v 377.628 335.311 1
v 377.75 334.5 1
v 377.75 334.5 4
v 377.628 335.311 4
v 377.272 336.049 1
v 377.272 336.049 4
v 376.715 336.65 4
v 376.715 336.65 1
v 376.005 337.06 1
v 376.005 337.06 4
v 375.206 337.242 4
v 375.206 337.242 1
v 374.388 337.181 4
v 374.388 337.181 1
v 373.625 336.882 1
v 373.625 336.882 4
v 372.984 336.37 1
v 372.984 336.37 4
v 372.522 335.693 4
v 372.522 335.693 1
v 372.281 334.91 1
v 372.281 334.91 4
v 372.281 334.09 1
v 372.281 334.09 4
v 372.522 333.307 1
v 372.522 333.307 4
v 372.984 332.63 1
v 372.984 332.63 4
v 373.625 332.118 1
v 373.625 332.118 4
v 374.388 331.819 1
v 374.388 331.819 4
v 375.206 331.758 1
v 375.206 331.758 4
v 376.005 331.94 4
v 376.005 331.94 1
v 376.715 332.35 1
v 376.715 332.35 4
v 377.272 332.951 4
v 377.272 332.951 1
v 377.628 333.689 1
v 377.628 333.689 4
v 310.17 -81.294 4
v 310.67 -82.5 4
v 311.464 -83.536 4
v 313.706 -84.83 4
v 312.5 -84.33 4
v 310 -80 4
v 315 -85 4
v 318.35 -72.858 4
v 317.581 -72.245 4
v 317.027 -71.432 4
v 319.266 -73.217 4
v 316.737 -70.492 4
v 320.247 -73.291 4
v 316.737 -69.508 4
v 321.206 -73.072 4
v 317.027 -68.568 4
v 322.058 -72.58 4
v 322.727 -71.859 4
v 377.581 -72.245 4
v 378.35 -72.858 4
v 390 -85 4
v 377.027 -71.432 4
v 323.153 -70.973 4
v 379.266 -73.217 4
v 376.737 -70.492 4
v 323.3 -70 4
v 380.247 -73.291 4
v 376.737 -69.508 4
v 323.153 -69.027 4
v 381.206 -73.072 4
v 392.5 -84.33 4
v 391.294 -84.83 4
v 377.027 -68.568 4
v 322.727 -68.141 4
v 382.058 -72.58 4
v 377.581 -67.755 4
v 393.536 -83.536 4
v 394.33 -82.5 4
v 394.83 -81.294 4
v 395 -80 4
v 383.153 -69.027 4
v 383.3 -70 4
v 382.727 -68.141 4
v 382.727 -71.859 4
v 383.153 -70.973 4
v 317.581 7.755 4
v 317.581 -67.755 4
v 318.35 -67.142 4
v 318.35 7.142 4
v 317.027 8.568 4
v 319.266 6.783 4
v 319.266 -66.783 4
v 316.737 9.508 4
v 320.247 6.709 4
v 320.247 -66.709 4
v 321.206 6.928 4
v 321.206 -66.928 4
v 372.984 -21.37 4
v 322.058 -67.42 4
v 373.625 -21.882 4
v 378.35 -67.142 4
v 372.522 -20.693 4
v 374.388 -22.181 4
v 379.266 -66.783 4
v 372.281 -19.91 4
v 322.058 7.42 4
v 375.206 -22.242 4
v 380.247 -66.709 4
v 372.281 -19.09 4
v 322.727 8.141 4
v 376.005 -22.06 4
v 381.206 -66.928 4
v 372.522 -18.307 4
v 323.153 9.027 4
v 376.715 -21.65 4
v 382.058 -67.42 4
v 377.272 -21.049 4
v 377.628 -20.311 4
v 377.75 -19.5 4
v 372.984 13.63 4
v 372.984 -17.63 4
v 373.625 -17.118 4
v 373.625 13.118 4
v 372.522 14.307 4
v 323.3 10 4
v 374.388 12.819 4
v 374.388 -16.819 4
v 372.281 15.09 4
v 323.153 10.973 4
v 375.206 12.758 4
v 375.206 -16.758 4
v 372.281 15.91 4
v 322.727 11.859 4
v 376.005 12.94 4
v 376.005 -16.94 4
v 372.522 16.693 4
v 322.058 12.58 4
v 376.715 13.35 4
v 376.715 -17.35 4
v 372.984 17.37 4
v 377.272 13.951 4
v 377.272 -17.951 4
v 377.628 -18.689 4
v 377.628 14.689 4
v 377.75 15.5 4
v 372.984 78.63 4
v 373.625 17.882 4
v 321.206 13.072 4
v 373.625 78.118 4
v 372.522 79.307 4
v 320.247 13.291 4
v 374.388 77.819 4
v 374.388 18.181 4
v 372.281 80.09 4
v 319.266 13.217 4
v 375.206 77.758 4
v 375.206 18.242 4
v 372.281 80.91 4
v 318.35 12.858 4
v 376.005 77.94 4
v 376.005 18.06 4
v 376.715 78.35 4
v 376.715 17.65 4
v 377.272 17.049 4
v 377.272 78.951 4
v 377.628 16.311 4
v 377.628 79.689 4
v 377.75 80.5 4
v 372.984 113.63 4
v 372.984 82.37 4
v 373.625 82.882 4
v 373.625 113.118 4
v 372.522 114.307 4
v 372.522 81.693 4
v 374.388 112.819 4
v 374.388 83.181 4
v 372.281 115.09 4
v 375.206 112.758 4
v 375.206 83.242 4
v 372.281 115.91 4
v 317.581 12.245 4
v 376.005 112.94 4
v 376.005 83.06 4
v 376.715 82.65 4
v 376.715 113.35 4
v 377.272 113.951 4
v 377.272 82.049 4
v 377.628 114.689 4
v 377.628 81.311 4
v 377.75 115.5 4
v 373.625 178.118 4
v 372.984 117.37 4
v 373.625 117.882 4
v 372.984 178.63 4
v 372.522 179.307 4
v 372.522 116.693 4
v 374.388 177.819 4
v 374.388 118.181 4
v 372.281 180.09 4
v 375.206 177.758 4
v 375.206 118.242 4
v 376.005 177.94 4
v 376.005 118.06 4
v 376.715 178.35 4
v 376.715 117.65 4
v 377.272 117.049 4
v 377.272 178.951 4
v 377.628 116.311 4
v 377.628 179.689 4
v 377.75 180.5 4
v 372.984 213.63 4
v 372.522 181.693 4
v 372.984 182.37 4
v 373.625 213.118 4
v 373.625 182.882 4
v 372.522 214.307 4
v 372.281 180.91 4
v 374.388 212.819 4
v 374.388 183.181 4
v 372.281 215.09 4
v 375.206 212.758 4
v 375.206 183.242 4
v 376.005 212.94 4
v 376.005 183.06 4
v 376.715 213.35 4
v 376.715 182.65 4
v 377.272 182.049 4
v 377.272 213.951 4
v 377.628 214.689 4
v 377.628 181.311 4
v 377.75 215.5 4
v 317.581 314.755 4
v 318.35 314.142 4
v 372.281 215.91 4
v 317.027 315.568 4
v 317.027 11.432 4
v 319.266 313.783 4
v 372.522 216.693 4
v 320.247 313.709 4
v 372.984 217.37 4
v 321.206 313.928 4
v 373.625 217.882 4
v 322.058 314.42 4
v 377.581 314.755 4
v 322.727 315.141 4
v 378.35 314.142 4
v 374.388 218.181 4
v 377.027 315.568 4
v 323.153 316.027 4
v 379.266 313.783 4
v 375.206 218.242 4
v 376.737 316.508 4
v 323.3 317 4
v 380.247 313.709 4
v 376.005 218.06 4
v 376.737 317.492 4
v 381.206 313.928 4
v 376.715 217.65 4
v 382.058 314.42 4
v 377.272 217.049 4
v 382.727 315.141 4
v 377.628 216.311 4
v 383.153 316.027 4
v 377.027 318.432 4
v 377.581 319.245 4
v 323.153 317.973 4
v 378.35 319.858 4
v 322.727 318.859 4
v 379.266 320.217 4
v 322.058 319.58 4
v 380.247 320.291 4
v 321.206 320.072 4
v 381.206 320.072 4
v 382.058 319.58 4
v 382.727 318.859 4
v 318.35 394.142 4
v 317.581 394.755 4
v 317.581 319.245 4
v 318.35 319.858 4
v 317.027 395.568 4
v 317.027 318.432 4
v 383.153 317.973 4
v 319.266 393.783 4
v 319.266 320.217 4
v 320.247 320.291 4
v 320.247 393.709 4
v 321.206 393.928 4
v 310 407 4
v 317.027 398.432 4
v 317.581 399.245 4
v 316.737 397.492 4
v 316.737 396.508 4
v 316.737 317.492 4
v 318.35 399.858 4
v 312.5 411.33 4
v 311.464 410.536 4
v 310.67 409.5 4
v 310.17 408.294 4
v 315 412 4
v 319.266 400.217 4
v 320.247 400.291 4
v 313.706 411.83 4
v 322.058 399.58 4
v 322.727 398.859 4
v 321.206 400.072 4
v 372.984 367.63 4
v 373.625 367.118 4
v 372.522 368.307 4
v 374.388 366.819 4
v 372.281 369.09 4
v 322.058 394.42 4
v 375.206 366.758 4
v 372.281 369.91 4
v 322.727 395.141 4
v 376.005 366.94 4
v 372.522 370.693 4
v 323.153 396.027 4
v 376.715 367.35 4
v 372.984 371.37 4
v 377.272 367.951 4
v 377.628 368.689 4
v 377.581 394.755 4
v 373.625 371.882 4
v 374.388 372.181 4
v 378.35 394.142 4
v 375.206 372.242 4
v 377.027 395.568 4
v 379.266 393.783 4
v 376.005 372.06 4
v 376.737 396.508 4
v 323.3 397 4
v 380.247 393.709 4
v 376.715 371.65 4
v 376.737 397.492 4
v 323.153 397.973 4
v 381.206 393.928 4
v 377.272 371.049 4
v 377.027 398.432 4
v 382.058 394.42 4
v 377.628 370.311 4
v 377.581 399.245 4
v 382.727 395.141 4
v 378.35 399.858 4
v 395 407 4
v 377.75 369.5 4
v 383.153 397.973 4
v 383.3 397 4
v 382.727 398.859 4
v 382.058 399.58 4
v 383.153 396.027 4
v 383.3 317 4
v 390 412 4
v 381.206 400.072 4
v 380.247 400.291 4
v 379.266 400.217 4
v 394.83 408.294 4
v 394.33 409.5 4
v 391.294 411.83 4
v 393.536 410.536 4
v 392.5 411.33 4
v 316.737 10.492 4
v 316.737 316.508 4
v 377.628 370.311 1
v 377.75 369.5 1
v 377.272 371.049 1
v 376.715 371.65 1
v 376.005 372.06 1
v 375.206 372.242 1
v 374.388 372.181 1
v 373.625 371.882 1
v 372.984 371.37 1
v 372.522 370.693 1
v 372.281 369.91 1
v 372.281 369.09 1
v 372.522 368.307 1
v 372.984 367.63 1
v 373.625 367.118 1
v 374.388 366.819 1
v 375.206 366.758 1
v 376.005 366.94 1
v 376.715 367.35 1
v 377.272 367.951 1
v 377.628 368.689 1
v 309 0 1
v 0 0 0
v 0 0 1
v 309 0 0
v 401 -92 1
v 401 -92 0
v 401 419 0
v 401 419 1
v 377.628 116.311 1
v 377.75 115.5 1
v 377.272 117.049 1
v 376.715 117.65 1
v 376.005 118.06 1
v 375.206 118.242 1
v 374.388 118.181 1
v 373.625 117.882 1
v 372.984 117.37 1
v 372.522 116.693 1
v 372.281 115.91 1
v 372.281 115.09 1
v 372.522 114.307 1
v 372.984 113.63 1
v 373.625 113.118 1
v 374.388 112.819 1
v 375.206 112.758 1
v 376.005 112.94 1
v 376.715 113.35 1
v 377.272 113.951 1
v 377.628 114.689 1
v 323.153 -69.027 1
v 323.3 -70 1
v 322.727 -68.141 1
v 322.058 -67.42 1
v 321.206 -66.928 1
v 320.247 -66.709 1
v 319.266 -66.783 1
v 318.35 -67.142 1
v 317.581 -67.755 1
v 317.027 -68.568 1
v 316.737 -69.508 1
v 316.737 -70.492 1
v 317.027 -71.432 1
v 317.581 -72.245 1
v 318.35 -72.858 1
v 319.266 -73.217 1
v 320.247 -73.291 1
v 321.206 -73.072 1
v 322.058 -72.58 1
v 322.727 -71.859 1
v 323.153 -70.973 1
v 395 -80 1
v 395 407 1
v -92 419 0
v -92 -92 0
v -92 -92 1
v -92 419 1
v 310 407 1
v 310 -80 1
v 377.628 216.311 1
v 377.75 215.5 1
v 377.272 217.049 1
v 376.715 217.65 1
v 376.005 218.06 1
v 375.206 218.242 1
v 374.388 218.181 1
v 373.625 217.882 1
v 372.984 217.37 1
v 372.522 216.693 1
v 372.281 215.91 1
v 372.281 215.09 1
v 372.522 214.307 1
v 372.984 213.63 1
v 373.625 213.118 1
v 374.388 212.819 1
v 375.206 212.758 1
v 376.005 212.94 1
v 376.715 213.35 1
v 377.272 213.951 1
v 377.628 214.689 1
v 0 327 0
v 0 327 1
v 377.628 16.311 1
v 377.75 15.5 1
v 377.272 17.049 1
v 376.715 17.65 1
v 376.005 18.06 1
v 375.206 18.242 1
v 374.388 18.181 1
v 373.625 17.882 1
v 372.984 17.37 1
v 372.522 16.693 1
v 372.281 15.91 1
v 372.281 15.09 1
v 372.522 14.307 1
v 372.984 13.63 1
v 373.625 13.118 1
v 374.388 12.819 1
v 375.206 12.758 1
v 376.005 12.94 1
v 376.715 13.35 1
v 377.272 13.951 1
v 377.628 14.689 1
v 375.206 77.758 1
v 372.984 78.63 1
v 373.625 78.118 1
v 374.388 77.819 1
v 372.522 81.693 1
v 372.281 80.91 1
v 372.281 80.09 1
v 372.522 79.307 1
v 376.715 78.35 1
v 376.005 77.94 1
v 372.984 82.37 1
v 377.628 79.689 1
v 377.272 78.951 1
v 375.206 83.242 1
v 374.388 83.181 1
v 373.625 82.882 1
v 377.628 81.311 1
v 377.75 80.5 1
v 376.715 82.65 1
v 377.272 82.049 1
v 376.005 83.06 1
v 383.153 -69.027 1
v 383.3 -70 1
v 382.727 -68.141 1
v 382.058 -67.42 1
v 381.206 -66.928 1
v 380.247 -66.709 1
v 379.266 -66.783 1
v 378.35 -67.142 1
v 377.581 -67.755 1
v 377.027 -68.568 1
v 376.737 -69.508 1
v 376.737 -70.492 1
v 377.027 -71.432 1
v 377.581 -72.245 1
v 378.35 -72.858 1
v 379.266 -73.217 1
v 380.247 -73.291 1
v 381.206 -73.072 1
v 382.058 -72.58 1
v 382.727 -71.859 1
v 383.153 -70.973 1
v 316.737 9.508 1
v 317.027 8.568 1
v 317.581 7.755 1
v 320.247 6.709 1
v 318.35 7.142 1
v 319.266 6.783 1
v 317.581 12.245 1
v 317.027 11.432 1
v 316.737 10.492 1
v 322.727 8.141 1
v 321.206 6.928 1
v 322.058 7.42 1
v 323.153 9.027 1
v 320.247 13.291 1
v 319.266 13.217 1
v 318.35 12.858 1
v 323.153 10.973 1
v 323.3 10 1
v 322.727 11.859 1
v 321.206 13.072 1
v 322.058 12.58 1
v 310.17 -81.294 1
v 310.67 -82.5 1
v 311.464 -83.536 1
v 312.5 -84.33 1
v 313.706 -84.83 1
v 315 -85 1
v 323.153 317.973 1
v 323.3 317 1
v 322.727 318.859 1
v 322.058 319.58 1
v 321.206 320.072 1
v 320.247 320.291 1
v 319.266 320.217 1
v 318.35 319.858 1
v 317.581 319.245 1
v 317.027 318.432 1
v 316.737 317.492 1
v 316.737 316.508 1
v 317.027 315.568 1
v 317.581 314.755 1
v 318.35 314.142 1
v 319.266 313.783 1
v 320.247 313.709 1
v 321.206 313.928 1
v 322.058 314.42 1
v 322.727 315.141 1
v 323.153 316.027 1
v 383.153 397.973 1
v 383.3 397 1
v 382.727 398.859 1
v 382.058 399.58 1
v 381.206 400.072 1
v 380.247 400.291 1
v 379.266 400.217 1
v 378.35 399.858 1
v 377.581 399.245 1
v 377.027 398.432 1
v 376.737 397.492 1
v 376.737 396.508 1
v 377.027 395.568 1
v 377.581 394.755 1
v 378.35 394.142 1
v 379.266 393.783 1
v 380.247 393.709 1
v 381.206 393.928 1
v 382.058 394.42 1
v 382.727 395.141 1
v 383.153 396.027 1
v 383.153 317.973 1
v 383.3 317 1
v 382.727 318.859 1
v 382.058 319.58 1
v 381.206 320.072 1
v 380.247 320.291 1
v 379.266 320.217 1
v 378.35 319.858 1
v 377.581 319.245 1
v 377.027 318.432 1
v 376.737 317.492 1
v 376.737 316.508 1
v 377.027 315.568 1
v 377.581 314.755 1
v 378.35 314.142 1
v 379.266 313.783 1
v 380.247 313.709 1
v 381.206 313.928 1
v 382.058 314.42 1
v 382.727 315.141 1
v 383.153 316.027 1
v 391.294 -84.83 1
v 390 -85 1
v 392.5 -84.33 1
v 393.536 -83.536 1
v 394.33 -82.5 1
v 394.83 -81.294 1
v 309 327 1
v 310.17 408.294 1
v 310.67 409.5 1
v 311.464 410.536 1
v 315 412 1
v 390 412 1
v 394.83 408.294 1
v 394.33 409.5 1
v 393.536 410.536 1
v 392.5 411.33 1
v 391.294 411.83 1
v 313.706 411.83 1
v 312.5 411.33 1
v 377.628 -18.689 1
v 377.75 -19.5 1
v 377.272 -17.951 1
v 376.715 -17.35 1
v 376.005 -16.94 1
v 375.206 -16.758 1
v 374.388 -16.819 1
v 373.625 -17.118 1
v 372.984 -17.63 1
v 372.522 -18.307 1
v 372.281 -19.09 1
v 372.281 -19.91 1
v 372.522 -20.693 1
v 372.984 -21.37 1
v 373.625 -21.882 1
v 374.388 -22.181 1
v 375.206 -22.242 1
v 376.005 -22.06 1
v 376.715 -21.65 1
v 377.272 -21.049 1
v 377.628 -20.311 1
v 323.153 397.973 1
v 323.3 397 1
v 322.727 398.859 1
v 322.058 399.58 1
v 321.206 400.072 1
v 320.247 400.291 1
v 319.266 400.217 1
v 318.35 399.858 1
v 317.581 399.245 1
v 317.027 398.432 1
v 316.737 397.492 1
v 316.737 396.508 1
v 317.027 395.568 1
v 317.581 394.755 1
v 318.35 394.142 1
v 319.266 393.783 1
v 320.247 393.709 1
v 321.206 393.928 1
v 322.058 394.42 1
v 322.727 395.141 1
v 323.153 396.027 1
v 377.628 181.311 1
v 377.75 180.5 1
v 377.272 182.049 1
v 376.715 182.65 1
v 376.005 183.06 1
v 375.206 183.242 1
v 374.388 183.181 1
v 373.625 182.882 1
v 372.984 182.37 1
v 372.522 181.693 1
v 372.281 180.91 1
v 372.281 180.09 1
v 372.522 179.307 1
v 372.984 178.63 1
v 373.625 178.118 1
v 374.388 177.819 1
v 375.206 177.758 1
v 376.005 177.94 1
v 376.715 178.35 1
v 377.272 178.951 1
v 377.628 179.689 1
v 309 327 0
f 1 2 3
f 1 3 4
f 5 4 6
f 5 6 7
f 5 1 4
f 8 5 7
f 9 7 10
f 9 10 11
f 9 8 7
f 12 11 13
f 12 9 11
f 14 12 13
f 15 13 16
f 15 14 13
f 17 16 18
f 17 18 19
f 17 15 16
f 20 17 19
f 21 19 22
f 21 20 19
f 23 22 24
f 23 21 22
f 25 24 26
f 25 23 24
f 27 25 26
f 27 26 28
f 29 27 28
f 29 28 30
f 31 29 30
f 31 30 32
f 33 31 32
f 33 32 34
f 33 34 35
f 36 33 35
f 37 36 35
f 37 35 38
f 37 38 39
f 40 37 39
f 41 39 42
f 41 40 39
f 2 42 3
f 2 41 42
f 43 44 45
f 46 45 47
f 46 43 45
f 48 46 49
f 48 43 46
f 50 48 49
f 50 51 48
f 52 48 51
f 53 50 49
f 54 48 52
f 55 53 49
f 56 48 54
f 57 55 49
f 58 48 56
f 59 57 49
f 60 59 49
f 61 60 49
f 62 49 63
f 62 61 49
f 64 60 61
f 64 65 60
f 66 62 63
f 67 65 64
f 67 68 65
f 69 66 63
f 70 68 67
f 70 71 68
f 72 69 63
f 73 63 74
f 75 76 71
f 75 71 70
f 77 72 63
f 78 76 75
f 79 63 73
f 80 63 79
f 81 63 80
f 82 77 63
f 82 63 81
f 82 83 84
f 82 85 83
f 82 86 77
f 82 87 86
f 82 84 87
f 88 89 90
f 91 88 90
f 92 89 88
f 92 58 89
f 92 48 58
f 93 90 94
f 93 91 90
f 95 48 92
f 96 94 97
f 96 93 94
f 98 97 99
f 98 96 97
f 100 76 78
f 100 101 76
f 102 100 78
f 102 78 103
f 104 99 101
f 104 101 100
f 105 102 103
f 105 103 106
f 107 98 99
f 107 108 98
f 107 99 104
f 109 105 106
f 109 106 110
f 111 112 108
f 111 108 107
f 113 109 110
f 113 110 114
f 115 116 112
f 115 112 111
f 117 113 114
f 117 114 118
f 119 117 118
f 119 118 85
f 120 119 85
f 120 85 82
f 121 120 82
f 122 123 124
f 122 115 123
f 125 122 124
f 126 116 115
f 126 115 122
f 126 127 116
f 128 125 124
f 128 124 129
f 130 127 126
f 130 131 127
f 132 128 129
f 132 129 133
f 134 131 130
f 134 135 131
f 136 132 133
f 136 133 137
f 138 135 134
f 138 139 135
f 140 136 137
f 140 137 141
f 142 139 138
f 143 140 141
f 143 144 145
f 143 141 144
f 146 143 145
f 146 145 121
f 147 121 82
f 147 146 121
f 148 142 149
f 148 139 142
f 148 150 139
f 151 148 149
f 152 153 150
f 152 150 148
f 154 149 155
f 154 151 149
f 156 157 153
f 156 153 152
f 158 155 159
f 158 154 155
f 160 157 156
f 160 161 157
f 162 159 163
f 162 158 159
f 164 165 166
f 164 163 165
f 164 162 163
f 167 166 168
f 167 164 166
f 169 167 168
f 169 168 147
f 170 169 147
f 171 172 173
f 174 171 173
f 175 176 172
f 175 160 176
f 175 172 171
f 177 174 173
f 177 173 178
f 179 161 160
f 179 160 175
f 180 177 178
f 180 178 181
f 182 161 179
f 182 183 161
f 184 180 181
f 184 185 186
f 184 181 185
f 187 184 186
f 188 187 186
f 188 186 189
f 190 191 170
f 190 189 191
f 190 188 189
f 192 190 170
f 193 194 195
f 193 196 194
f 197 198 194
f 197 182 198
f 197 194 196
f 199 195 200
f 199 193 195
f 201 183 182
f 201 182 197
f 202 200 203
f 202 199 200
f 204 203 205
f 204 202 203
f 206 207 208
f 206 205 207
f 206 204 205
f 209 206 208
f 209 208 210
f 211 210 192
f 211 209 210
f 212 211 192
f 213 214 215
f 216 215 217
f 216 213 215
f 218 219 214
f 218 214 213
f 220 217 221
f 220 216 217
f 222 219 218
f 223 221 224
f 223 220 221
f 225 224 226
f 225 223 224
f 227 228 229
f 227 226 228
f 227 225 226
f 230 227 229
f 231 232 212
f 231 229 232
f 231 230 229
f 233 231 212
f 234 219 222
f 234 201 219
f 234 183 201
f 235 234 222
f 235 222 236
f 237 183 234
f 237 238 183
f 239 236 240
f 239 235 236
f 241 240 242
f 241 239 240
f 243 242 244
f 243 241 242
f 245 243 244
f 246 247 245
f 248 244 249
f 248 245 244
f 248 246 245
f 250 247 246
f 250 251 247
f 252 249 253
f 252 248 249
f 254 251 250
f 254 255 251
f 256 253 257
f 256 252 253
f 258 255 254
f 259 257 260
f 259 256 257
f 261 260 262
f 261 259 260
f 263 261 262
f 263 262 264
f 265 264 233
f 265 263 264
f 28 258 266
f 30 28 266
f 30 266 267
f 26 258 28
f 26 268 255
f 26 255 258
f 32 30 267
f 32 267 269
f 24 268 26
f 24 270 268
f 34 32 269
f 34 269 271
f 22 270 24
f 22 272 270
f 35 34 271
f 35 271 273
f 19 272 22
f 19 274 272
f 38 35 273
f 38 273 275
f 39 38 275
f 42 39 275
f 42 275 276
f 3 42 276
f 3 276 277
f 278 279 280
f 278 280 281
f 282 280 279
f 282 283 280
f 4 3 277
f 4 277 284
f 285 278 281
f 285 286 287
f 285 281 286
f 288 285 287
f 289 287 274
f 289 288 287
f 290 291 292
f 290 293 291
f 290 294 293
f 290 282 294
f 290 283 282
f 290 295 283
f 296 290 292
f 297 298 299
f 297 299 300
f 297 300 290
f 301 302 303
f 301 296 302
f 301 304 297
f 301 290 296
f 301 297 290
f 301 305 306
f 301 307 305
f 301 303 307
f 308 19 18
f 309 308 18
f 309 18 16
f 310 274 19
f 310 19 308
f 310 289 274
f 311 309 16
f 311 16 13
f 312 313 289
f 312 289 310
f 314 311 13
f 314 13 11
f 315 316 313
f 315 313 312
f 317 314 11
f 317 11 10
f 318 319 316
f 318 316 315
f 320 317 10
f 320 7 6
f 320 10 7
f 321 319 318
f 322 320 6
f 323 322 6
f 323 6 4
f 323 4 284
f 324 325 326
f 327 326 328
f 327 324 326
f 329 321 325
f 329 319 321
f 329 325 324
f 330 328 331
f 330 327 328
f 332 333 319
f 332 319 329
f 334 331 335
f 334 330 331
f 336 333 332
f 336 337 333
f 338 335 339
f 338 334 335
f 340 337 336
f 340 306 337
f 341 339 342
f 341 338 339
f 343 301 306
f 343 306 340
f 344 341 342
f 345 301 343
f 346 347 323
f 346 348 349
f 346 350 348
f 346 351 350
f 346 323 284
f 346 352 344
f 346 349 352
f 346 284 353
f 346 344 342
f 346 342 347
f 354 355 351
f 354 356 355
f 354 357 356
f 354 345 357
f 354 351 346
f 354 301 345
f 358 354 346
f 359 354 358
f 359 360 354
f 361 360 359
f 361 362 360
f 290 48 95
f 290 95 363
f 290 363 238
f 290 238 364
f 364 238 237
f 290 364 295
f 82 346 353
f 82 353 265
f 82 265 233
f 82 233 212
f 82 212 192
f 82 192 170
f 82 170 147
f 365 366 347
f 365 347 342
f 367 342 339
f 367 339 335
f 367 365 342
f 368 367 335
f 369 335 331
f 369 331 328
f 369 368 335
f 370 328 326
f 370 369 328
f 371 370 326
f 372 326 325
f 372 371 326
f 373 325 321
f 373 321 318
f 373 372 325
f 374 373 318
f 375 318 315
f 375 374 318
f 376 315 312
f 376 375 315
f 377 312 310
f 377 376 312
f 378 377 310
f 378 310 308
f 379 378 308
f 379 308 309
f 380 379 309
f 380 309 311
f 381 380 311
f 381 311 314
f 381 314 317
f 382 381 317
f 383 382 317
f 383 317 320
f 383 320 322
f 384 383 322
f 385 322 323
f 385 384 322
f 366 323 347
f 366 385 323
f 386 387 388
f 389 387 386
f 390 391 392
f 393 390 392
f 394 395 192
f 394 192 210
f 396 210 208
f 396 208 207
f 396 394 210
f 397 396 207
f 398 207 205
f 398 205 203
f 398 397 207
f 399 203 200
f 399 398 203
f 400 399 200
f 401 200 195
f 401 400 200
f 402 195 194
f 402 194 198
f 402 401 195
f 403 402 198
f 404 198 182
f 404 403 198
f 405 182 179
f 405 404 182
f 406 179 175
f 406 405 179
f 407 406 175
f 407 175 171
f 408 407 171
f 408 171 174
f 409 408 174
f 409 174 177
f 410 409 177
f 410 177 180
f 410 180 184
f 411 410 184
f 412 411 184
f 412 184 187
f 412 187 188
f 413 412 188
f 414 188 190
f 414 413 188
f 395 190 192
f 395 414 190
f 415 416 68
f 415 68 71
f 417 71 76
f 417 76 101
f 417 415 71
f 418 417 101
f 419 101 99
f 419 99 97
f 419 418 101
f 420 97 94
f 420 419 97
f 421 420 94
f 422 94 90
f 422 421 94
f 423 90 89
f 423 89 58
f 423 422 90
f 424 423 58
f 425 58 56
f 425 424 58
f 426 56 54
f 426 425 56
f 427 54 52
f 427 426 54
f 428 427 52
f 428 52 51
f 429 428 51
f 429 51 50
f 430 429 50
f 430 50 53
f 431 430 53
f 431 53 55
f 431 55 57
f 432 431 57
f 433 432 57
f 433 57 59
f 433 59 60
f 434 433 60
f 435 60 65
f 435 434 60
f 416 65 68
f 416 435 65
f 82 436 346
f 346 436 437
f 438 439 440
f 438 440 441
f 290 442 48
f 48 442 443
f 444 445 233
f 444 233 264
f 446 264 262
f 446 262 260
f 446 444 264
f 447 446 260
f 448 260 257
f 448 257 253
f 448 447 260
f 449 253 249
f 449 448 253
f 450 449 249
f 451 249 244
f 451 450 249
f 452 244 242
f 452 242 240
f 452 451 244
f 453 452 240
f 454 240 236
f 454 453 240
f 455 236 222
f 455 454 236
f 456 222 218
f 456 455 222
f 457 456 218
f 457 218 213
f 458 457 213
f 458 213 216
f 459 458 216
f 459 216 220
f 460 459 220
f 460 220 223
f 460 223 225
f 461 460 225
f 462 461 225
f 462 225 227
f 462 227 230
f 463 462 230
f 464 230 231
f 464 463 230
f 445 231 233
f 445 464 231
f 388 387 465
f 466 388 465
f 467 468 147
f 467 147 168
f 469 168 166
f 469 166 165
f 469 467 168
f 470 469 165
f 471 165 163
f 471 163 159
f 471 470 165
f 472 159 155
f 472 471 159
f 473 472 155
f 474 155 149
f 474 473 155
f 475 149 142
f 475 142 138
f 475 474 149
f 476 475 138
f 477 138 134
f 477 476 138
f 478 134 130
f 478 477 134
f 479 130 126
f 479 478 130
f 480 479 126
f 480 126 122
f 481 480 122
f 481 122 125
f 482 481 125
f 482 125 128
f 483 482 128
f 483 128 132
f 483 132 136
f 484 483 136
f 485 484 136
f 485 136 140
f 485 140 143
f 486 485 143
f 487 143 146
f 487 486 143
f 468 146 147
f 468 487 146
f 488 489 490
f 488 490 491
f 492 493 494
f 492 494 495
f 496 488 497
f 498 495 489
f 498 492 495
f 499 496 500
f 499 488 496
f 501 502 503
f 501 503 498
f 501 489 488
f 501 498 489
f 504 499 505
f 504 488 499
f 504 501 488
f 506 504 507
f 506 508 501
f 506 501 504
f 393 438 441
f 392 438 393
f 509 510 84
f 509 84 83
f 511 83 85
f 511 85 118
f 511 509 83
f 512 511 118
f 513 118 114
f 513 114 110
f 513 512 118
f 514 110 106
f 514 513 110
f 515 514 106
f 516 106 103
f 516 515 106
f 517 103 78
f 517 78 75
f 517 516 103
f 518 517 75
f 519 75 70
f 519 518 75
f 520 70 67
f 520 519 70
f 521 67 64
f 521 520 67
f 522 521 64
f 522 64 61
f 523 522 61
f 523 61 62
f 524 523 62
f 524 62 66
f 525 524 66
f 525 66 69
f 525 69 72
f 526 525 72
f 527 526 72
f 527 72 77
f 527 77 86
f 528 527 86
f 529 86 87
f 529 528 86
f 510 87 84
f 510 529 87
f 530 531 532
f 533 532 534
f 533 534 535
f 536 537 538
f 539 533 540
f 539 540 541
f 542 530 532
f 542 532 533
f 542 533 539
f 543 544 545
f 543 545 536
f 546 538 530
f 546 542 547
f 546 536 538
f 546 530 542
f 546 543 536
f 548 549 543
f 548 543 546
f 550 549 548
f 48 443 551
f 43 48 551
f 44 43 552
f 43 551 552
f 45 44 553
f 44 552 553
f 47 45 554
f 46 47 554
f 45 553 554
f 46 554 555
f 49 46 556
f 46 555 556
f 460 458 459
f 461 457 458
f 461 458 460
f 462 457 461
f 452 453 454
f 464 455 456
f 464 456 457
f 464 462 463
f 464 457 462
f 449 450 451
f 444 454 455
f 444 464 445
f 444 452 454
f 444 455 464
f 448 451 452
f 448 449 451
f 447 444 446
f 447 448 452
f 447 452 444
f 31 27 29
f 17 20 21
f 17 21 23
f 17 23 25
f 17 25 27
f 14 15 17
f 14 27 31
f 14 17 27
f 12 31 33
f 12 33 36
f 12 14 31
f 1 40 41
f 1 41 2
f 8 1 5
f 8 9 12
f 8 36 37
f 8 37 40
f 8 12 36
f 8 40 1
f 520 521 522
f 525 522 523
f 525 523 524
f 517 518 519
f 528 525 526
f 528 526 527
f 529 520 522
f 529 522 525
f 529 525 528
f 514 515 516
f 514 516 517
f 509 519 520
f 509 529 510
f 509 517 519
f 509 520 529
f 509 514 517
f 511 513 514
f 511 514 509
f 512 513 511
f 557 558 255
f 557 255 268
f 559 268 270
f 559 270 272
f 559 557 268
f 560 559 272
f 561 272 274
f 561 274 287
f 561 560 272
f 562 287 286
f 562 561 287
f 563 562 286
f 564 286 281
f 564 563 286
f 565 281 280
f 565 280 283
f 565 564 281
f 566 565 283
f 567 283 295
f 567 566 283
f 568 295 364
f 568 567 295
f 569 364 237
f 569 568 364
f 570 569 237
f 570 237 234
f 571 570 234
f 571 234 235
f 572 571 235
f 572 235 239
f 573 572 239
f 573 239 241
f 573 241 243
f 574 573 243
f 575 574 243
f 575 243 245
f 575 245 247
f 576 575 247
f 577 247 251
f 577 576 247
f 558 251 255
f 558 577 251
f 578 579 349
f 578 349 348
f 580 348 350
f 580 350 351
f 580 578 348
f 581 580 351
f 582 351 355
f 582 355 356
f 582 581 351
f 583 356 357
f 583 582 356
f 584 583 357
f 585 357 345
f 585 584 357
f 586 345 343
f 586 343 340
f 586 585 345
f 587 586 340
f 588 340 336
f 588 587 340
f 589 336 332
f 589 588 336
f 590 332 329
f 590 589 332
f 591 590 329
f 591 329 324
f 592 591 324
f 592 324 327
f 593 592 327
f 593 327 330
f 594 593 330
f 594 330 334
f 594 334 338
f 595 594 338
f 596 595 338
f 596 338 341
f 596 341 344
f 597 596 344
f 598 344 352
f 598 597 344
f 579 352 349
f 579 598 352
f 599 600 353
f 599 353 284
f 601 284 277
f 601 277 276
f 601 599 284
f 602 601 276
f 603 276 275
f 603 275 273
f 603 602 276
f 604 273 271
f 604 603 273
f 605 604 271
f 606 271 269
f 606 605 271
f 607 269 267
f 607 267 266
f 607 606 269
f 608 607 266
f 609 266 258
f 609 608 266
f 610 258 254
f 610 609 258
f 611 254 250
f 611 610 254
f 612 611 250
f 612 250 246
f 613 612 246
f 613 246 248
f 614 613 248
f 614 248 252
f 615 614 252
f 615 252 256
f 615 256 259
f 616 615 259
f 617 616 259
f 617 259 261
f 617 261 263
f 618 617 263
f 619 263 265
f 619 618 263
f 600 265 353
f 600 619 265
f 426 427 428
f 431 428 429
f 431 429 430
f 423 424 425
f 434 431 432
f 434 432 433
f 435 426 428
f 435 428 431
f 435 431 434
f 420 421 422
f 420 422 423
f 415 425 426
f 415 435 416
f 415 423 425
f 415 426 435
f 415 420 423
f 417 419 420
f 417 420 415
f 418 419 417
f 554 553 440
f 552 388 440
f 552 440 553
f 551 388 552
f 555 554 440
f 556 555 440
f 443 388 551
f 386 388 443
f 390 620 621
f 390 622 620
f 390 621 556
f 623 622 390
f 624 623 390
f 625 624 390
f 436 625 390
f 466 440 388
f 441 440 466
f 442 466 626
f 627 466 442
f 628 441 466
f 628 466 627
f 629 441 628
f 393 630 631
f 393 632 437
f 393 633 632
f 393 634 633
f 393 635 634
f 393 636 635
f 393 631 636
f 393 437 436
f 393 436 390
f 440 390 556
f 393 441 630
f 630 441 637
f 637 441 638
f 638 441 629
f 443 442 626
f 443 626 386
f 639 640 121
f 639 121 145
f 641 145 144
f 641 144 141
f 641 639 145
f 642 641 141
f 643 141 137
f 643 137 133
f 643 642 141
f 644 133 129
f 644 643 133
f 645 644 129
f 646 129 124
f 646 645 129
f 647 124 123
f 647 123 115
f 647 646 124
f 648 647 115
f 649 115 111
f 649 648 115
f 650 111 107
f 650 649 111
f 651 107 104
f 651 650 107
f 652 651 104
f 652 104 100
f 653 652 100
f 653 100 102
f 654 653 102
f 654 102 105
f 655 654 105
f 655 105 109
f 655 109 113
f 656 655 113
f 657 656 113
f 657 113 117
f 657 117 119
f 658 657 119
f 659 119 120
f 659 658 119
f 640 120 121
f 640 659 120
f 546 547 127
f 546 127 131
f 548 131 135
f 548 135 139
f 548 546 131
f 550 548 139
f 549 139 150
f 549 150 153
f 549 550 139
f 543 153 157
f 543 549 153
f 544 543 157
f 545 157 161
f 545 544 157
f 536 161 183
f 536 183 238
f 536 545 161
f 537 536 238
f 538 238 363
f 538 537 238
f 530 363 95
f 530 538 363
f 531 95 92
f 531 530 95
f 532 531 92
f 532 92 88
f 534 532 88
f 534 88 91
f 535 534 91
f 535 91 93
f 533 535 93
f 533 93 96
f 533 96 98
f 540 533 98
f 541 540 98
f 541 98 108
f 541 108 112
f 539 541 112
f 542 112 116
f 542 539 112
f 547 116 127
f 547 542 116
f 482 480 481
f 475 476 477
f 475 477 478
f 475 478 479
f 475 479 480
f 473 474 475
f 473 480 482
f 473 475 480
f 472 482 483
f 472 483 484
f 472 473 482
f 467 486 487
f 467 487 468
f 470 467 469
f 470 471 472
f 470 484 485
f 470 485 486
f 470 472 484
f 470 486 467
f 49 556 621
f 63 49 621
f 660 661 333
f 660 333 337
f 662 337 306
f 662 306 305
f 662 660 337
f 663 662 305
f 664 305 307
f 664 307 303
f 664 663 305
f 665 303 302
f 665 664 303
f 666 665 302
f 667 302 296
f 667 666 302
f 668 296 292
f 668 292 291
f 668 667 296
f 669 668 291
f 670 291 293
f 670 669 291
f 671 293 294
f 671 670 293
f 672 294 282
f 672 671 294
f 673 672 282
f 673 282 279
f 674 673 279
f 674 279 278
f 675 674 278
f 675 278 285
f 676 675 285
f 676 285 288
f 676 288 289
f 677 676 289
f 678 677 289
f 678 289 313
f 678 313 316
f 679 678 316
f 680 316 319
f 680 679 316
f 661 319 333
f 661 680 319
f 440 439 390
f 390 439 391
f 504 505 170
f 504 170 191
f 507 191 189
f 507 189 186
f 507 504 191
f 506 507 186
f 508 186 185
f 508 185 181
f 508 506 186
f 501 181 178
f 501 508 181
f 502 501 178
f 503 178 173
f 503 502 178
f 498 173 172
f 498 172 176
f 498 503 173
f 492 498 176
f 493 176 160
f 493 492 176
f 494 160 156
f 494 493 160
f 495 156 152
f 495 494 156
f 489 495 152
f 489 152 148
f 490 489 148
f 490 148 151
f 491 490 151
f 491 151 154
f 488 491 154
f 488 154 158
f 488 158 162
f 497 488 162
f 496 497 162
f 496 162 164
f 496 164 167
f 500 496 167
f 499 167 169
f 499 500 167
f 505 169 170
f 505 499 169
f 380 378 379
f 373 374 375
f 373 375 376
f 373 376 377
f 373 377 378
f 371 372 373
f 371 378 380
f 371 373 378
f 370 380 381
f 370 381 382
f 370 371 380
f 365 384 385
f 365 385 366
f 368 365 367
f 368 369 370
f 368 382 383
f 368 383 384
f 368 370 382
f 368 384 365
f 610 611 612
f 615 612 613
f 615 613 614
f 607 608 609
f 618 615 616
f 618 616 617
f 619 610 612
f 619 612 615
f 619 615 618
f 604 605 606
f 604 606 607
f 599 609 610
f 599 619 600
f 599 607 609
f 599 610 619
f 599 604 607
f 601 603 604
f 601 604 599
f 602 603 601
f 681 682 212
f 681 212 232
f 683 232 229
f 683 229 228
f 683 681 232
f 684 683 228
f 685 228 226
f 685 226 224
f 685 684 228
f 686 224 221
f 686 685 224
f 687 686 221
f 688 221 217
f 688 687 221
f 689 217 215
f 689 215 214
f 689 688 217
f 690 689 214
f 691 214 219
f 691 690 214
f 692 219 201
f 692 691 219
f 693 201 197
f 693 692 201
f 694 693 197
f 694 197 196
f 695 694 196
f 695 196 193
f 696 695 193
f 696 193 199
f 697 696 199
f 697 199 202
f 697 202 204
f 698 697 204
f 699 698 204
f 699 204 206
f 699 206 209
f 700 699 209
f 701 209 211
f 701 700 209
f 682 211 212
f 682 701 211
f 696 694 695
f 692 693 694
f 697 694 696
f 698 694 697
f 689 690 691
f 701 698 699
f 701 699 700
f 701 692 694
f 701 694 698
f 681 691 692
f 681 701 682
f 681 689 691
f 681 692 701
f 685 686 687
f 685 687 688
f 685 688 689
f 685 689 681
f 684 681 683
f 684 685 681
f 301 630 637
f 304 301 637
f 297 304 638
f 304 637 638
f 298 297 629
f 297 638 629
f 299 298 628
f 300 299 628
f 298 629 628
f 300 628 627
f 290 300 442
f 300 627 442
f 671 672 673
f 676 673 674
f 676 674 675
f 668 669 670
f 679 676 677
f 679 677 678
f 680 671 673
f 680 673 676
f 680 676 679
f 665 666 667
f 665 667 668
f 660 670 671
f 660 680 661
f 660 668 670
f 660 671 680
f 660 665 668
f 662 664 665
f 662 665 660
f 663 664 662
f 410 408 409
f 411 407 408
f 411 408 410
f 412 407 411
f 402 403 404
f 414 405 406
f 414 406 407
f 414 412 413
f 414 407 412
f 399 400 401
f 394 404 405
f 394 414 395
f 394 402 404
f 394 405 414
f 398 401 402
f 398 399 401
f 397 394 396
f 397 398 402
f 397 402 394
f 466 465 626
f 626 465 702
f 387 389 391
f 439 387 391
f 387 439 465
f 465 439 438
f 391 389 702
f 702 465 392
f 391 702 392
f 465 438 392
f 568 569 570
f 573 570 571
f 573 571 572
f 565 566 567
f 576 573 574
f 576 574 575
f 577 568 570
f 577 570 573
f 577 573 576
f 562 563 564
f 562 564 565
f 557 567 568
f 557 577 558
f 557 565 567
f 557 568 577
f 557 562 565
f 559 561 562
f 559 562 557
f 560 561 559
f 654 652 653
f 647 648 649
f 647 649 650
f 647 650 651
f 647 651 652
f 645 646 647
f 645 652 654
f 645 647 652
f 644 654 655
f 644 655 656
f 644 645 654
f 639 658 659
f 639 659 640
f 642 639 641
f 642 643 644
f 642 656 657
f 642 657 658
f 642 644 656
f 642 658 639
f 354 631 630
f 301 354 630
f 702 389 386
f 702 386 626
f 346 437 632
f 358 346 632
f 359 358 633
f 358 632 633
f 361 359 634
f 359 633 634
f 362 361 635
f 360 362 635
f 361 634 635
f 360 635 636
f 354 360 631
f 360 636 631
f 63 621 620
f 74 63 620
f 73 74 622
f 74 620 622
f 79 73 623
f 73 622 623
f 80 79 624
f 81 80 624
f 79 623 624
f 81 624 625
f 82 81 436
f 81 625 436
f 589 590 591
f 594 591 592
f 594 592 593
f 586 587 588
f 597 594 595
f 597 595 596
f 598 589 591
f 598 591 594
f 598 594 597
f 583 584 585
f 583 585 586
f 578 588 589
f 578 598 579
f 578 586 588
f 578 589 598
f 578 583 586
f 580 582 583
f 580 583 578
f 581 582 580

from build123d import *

# Parameters (mm, degrees)
F0_W     = 493
F0_H     = 511
F0_W_2   = 309
F0_H_2   = 327
F1_DEPTH = 1
F2_R     = 3.3
F2_R_2   = 2.75
F3_DEPTH = 3


with BuildPart() as f1:
    # F0 (on Top) → F1 (new body)
    with BuildSketch(Plane.XY):
        with Locations((154.5, 163.5)):
            Rectangle(F0_W, F0_H)
        with Locations((154.5, 163.5)):
            Rectangle(F0_W_2, F0_H_2, mode=Mode.SUBTRACT)
    extrude(amount=F1_DEPTH)

    # F2 (on face) → F3 (join)
    with BuildSketch(Plane.XY.offset(1)):
        with BuildLine():
            Line((390, 412), (315, 412))
            ThreePointArc((315, 412), (311.464466, 410.535534), (310, 407))
            Line((310, 407), (310, -80))
            ThreePointArc((310, -80), (311.464466, -83.535534), (315, -85))
            Line((315, -85), (390, -85))
            ThreePointArc((390, -85), (393.535534, -83.535534), (395, -80))
            Line((395, -80), (395, 407))
            ThreePointArc((395, 407), (393.535534, 410.535534), (390, 412))
        make_face()
        with Locations((320, -70)):
            Circle(F2_R, mode=Mode.SUBTRACT)
        with Locations((380, -70)):
            Circle(F2_R, mode=Mode.SUBTRACT)
        with Locations((320, 10)):
            Circle(F2_R, mode=Mode.SUBTRACT)
        with Locations((375, -19.5)):
            Circle(F2_R_2, mode=Mode.SUBTRACT)
        with Locations((375, 15.5)):
            Circle(F2_R_2, mode=Mode.SUBTRACT)
        with Locations((375, 80.5)):
            Circle(F2_R_2, mode=Mode.SUBTRACT)
        with Locations((375, 115.5)):
            Circle(F2_R_2, mode=Mode.SUBTRACT)
        with Locations((375, 180.5)):
            Circle(F2_R_2, mode=Mode.SUBTRACT)
        with Locations((375, 215.5)):
            Circle(F2_R_2, mode=Mode.SUBTRACT)
        with Locations((320, 317)):
            Circle(F2_R, mode=Mode.SUBTRACT)
        with Locations((380, 317)):
            Circle(F2_R, mode=Mode.SUBTRACT)
        with Locations((375, 334.5)):
            Circle(F2_R_2, mode=Mode.SUBTRACT)
        with Locations((320, 397)):
            Circle(F2_R, mode=Mode.SUBTRACT)
        with Locations((375, 369.5)):
            Circle(F2_R_2, mode=Mode.SUBTRACT)
        with Locations((380, 397)):
            Circle(F2_R, mode=Mode.SUBTRACT)
    extrude(amount=F3_DEPTH)


solid = f1.part
